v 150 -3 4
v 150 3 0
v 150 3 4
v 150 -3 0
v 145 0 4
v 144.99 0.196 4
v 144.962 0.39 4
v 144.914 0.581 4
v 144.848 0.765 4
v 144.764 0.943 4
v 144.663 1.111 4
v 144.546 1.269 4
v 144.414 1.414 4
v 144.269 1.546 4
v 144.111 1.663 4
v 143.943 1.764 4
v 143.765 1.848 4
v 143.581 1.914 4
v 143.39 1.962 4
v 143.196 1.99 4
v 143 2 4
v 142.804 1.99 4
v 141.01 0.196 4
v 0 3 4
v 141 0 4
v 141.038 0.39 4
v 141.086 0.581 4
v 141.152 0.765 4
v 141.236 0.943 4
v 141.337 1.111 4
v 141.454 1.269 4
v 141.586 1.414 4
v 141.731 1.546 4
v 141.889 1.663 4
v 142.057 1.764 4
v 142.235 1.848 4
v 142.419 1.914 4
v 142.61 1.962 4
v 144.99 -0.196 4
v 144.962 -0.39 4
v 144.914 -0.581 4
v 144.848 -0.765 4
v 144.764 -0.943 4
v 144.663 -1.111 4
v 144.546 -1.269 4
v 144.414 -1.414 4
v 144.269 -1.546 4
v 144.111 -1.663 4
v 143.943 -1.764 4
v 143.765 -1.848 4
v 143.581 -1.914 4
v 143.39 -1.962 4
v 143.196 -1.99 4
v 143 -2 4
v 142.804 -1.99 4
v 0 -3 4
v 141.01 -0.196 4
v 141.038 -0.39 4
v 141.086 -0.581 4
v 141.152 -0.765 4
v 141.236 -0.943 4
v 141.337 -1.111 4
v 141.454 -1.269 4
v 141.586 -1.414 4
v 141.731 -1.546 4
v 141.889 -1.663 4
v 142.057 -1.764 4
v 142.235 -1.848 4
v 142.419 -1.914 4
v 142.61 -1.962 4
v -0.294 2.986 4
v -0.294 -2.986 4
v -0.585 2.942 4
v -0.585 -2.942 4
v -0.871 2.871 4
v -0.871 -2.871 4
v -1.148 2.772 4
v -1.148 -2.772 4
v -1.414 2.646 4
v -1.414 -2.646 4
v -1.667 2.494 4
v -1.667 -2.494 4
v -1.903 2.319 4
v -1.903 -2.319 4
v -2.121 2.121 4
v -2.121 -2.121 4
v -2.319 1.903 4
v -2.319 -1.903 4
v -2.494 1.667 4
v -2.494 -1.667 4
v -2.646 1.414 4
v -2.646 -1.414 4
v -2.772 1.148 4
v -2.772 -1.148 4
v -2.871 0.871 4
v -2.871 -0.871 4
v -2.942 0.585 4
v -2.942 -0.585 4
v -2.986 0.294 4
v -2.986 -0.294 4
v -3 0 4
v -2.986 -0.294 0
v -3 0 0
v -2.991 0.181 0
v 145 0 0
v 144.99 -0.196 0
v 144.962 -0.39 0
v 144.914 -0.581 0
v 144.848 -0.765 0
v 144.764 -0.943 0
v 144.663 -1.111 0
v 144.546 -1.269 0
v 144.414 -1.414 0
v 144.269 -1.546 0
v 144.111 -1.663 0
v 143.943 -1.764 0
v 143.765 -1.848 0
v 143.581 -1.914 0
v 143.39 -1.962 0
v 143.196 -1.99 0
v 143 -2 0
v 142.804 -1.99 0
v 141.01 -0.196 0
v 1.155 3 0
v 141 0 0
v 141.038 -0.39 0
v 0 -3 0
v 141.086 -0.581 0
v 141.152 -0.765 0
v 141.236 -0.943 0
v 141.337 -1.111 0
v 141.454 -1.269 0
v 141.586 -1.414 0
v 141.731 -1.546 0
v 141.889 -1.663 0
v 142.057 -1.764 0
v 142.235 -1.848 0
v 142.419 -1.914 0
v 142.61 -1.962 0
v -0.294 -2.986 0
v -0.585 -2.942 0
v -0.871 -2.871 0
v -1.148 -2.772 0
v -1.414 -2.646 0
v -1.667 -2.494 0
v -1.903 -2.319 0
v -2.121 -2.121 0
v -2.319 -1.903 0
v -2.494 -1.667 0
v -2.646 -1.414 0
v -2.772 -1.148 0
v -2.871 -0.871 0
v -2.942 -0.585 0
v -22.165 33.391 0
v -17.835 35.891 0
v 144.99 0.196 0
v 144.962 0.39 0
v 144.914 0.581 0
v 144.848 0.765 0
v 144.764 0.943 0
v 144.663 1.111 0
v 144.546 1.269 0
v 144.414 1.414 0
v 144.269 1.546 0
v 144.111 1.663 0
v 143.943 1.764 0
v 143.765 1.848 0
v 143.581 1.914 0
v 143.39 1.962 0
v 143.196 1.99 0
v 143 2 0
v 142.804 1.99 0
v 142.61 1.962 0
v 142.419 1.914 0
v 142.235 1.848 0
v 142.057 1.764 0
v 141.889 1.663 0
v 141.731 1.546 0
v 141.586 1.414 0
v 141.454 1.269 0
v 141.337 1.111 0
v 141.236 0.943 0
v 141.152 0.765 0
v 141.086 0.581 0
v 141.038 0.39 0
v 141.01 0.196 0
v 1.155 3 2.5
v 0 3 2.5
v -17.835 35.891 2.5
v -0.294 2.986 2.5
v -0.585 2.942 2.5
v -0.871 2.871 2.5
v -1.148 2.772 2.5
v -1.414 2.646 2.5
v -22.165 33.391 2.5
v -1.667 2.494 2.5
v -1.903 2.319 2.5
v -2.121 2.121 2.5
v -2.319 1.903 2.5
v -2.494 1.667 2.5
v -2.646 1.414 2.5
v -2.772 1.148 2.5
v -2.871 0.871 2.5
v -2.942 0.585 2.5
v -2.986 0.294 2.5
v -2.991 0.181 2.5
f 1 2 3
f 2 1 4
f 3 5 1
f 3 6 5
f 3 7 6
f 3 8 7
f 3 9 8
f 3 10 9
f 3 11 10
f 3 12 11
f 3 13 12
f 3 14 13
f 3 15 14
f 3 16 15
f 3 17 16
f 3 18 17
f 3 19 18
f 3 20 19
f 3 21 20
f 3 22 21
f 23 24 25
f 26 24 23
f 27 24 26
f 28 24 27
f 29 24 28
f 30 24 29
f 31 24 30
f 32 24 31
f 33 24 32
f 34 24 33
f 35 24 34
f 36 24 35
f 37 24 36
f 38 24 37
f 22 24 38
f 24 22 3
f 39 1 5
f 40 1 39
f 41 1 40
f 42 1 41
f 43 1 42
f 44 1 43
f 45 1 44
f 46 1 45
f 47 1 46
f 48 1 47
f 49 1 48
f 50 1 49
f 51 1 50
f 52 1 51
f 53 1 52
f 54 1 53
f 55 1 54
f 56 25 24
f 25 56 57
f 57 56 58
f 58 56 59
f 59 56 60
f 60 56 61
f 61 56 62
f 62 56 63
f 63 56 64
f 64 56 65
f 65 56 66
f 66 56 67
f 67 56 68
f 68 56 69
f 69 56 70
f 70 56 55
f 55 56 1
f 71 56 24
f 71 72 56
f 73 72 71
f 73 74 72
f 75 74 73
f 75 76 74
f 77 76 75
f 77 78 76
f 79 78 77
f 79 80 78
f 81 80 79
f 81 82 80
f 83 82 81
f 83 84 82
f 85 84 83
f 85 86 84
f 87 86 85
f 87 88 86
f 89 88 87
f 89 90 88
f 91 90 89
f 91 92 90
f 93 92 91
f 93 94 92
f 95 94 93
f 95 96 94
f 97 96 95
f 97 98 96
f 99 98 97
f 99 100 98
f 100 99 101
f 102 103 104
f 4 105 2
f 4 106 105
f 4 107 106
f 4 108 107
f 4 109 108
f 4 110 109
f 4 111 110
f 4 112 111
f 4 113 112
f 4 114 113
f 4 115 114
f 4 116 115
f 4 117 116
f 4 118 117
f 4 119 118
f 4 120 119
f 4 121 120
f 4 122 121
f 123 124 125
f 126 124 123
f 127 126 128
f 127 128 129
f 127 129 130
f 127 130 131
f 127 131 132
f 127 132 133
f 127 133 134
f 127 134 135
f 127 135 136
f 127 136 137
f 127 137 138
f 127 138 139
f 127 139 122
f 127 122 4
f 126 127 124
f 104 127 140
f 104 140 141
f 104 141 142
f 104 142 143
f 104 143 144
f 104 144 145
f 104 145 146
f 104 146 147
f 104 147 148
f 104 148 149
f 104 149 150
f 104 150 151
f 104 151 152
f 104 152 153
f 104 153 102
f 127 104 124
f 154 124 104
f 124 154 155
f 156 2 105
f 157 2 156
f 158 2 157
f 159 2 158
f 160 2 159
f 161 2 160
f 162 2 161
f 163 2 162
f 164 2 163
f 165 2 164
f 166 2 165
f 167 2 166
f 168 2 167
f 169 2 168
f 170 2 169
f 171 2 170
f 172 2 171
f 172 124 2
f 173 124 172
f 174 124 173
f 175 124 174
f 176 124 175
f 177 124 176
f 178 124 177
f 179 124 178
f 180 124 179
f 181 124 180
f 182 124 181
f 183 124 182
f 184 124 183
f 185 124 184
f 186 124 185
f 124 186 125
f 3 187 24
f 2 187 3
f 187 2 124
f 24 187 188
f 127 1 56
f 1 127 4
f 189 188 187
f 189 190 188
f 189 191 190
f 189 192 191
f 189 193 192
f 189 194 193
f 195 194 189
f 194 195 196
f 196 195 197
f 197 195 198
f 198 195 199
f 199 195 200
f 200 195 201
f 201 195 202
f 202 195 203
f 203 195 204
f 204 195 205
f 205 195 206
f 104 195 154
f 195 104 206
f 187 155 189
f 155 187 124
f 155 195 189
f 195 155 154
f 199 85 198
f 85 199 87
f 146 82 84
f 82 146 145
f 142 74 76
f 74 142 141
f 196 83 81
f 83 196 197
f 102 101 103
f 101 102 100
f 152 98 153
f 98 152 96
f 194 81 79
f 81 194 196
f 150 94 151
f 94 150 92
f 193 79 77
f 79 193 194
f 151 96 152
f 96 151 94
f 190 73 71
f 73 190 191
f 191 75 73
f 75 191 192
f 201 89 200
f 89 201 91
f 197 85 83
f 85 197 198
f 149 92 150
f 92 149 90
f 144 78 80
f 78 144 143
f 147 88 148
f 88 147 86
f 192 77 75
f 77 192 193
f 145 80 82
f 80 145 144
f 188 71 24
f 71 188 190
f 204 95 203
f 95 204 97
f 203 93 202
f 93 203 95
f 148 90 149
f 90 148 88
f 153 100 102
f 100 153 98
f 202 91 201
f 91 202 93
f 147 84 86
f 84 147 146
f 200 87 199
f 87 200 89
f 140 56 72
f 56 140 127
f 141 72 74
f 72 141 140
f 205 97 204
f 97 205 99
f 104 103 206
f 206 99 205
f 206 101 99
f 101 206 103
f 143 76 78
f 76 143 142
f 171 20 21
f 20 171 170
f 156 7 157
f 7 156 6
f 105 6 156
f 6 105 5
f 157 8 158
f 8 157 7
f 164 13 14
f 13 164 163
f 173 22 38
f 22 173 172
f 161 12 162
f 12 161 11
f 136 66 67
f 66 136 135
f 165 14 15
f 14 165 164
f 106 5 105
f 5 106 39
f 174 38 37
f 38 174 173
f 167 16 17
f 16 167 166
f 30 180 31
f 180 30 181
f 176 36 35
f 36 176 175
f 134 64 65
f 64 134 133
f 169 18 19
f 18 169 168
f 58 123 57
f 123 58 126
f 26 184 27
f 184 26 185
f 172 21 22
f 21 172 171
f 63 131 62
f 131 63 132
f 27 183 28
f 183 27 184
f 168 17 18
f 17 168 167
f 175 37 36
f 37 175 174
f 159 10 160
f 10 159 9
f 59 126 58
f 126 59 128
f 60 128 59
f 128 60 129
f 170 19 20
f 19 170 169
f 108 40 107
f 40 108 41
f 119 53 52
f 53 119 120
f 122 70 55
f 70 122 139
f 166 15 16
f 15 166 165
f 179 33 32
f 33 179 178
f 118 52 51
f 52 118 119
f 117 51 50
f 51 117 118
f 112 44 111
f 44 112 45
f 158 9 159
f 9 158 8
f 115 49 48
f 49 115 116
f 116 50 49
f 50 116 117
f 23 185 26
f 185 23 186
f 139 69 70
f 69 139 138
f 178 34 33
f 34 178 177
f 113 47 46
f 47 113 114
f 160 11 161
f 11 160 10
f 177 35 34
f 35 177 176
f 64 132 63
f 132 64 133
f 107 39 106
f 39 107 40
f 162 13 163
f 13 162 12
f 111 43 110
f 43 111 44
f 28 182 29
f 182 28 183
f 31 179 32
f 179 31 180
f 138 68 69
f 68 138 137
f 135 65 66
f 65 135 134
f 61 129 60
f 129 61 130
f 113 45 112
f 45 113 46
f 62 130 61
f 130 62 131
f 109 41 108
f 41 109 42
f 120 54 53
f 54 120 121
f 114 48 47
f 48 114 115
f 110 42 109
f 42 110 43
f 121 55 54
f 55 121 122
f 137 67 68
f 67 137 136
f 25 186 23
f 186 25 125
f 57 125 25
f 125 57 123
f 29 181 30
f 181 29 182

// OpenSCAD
// L-shaped (hockey-stick) cell spreader
// Designed for FDM printing, lying flat on the XY plane.

// --- Dimensions (mm) ---
handle_length = 150;        // Length of the handle bar
handle_width = 6;           // Width of the handle bar
handle_thickness = 4;       // Thickness of the handle bar
handle_hole_x = 143;        // X position of the hanging hole
handle_hole_radius = 2;     // Radius of the 4mm diameter hanging hole

foot_length = 40;           // Length of the spreading foot
foot_width = 5;             // Width of the spreading foot
foot_thickness = 2.5;       // Thickness of the spreading foot (agar side)

boss_diameter = 6;          // Diameter of the joining boss
boss_height = 4;            // Height of the joining boss

angle_deg = 120;            // Angle between handle and foot (counter-clockwise from +X)
$fn = 64;                   // Smoothness for cylinders/circles

// --- Implementation ---

module spreader() {
    difference() {
        union() {
            // 1. The Handle
            // Centered on Y, extends from X=0 to X=150
            translate([handle_length/2, 0, handle_thickness/2])
                cube([handle_length, handle_width, handle_thickness], center = true);
            
            // 2. The Spreading Foot
            // Rotated 120 degrees from +X axis
            // We use a hull or a rotated cube to ensure the foot meets the origin correctly
            rotate([0, 0, angle_deg])
                translate([foot_length/2, 0, foot_thickness/2])
                    cube([foot_length, foot_width, foot_thickness], center = true);
            
            // 3. The Boss (Joining piece at the origin)
            // Placed at the origin to bridge the two bars
            translate([0, 0, boss_height/2])
                cylinder(h = boss_height, d = boss_diameter, center = true);
        }

        // 4. The Hanging Hole
        // Located at x = 143, y = 0, through the handle
        // We extend the cylinder slightly in Z to ensure a clean cut
        translate([handle_hole_x, 0, -1])
            cylinder(h = handle_thickness + 2, d = handle_hole_radius * 2);
    }
}

// Render the part
// The part is designed to be printed lying flat on the XY plane.
// The handle lies along the X axis.
spreader();
